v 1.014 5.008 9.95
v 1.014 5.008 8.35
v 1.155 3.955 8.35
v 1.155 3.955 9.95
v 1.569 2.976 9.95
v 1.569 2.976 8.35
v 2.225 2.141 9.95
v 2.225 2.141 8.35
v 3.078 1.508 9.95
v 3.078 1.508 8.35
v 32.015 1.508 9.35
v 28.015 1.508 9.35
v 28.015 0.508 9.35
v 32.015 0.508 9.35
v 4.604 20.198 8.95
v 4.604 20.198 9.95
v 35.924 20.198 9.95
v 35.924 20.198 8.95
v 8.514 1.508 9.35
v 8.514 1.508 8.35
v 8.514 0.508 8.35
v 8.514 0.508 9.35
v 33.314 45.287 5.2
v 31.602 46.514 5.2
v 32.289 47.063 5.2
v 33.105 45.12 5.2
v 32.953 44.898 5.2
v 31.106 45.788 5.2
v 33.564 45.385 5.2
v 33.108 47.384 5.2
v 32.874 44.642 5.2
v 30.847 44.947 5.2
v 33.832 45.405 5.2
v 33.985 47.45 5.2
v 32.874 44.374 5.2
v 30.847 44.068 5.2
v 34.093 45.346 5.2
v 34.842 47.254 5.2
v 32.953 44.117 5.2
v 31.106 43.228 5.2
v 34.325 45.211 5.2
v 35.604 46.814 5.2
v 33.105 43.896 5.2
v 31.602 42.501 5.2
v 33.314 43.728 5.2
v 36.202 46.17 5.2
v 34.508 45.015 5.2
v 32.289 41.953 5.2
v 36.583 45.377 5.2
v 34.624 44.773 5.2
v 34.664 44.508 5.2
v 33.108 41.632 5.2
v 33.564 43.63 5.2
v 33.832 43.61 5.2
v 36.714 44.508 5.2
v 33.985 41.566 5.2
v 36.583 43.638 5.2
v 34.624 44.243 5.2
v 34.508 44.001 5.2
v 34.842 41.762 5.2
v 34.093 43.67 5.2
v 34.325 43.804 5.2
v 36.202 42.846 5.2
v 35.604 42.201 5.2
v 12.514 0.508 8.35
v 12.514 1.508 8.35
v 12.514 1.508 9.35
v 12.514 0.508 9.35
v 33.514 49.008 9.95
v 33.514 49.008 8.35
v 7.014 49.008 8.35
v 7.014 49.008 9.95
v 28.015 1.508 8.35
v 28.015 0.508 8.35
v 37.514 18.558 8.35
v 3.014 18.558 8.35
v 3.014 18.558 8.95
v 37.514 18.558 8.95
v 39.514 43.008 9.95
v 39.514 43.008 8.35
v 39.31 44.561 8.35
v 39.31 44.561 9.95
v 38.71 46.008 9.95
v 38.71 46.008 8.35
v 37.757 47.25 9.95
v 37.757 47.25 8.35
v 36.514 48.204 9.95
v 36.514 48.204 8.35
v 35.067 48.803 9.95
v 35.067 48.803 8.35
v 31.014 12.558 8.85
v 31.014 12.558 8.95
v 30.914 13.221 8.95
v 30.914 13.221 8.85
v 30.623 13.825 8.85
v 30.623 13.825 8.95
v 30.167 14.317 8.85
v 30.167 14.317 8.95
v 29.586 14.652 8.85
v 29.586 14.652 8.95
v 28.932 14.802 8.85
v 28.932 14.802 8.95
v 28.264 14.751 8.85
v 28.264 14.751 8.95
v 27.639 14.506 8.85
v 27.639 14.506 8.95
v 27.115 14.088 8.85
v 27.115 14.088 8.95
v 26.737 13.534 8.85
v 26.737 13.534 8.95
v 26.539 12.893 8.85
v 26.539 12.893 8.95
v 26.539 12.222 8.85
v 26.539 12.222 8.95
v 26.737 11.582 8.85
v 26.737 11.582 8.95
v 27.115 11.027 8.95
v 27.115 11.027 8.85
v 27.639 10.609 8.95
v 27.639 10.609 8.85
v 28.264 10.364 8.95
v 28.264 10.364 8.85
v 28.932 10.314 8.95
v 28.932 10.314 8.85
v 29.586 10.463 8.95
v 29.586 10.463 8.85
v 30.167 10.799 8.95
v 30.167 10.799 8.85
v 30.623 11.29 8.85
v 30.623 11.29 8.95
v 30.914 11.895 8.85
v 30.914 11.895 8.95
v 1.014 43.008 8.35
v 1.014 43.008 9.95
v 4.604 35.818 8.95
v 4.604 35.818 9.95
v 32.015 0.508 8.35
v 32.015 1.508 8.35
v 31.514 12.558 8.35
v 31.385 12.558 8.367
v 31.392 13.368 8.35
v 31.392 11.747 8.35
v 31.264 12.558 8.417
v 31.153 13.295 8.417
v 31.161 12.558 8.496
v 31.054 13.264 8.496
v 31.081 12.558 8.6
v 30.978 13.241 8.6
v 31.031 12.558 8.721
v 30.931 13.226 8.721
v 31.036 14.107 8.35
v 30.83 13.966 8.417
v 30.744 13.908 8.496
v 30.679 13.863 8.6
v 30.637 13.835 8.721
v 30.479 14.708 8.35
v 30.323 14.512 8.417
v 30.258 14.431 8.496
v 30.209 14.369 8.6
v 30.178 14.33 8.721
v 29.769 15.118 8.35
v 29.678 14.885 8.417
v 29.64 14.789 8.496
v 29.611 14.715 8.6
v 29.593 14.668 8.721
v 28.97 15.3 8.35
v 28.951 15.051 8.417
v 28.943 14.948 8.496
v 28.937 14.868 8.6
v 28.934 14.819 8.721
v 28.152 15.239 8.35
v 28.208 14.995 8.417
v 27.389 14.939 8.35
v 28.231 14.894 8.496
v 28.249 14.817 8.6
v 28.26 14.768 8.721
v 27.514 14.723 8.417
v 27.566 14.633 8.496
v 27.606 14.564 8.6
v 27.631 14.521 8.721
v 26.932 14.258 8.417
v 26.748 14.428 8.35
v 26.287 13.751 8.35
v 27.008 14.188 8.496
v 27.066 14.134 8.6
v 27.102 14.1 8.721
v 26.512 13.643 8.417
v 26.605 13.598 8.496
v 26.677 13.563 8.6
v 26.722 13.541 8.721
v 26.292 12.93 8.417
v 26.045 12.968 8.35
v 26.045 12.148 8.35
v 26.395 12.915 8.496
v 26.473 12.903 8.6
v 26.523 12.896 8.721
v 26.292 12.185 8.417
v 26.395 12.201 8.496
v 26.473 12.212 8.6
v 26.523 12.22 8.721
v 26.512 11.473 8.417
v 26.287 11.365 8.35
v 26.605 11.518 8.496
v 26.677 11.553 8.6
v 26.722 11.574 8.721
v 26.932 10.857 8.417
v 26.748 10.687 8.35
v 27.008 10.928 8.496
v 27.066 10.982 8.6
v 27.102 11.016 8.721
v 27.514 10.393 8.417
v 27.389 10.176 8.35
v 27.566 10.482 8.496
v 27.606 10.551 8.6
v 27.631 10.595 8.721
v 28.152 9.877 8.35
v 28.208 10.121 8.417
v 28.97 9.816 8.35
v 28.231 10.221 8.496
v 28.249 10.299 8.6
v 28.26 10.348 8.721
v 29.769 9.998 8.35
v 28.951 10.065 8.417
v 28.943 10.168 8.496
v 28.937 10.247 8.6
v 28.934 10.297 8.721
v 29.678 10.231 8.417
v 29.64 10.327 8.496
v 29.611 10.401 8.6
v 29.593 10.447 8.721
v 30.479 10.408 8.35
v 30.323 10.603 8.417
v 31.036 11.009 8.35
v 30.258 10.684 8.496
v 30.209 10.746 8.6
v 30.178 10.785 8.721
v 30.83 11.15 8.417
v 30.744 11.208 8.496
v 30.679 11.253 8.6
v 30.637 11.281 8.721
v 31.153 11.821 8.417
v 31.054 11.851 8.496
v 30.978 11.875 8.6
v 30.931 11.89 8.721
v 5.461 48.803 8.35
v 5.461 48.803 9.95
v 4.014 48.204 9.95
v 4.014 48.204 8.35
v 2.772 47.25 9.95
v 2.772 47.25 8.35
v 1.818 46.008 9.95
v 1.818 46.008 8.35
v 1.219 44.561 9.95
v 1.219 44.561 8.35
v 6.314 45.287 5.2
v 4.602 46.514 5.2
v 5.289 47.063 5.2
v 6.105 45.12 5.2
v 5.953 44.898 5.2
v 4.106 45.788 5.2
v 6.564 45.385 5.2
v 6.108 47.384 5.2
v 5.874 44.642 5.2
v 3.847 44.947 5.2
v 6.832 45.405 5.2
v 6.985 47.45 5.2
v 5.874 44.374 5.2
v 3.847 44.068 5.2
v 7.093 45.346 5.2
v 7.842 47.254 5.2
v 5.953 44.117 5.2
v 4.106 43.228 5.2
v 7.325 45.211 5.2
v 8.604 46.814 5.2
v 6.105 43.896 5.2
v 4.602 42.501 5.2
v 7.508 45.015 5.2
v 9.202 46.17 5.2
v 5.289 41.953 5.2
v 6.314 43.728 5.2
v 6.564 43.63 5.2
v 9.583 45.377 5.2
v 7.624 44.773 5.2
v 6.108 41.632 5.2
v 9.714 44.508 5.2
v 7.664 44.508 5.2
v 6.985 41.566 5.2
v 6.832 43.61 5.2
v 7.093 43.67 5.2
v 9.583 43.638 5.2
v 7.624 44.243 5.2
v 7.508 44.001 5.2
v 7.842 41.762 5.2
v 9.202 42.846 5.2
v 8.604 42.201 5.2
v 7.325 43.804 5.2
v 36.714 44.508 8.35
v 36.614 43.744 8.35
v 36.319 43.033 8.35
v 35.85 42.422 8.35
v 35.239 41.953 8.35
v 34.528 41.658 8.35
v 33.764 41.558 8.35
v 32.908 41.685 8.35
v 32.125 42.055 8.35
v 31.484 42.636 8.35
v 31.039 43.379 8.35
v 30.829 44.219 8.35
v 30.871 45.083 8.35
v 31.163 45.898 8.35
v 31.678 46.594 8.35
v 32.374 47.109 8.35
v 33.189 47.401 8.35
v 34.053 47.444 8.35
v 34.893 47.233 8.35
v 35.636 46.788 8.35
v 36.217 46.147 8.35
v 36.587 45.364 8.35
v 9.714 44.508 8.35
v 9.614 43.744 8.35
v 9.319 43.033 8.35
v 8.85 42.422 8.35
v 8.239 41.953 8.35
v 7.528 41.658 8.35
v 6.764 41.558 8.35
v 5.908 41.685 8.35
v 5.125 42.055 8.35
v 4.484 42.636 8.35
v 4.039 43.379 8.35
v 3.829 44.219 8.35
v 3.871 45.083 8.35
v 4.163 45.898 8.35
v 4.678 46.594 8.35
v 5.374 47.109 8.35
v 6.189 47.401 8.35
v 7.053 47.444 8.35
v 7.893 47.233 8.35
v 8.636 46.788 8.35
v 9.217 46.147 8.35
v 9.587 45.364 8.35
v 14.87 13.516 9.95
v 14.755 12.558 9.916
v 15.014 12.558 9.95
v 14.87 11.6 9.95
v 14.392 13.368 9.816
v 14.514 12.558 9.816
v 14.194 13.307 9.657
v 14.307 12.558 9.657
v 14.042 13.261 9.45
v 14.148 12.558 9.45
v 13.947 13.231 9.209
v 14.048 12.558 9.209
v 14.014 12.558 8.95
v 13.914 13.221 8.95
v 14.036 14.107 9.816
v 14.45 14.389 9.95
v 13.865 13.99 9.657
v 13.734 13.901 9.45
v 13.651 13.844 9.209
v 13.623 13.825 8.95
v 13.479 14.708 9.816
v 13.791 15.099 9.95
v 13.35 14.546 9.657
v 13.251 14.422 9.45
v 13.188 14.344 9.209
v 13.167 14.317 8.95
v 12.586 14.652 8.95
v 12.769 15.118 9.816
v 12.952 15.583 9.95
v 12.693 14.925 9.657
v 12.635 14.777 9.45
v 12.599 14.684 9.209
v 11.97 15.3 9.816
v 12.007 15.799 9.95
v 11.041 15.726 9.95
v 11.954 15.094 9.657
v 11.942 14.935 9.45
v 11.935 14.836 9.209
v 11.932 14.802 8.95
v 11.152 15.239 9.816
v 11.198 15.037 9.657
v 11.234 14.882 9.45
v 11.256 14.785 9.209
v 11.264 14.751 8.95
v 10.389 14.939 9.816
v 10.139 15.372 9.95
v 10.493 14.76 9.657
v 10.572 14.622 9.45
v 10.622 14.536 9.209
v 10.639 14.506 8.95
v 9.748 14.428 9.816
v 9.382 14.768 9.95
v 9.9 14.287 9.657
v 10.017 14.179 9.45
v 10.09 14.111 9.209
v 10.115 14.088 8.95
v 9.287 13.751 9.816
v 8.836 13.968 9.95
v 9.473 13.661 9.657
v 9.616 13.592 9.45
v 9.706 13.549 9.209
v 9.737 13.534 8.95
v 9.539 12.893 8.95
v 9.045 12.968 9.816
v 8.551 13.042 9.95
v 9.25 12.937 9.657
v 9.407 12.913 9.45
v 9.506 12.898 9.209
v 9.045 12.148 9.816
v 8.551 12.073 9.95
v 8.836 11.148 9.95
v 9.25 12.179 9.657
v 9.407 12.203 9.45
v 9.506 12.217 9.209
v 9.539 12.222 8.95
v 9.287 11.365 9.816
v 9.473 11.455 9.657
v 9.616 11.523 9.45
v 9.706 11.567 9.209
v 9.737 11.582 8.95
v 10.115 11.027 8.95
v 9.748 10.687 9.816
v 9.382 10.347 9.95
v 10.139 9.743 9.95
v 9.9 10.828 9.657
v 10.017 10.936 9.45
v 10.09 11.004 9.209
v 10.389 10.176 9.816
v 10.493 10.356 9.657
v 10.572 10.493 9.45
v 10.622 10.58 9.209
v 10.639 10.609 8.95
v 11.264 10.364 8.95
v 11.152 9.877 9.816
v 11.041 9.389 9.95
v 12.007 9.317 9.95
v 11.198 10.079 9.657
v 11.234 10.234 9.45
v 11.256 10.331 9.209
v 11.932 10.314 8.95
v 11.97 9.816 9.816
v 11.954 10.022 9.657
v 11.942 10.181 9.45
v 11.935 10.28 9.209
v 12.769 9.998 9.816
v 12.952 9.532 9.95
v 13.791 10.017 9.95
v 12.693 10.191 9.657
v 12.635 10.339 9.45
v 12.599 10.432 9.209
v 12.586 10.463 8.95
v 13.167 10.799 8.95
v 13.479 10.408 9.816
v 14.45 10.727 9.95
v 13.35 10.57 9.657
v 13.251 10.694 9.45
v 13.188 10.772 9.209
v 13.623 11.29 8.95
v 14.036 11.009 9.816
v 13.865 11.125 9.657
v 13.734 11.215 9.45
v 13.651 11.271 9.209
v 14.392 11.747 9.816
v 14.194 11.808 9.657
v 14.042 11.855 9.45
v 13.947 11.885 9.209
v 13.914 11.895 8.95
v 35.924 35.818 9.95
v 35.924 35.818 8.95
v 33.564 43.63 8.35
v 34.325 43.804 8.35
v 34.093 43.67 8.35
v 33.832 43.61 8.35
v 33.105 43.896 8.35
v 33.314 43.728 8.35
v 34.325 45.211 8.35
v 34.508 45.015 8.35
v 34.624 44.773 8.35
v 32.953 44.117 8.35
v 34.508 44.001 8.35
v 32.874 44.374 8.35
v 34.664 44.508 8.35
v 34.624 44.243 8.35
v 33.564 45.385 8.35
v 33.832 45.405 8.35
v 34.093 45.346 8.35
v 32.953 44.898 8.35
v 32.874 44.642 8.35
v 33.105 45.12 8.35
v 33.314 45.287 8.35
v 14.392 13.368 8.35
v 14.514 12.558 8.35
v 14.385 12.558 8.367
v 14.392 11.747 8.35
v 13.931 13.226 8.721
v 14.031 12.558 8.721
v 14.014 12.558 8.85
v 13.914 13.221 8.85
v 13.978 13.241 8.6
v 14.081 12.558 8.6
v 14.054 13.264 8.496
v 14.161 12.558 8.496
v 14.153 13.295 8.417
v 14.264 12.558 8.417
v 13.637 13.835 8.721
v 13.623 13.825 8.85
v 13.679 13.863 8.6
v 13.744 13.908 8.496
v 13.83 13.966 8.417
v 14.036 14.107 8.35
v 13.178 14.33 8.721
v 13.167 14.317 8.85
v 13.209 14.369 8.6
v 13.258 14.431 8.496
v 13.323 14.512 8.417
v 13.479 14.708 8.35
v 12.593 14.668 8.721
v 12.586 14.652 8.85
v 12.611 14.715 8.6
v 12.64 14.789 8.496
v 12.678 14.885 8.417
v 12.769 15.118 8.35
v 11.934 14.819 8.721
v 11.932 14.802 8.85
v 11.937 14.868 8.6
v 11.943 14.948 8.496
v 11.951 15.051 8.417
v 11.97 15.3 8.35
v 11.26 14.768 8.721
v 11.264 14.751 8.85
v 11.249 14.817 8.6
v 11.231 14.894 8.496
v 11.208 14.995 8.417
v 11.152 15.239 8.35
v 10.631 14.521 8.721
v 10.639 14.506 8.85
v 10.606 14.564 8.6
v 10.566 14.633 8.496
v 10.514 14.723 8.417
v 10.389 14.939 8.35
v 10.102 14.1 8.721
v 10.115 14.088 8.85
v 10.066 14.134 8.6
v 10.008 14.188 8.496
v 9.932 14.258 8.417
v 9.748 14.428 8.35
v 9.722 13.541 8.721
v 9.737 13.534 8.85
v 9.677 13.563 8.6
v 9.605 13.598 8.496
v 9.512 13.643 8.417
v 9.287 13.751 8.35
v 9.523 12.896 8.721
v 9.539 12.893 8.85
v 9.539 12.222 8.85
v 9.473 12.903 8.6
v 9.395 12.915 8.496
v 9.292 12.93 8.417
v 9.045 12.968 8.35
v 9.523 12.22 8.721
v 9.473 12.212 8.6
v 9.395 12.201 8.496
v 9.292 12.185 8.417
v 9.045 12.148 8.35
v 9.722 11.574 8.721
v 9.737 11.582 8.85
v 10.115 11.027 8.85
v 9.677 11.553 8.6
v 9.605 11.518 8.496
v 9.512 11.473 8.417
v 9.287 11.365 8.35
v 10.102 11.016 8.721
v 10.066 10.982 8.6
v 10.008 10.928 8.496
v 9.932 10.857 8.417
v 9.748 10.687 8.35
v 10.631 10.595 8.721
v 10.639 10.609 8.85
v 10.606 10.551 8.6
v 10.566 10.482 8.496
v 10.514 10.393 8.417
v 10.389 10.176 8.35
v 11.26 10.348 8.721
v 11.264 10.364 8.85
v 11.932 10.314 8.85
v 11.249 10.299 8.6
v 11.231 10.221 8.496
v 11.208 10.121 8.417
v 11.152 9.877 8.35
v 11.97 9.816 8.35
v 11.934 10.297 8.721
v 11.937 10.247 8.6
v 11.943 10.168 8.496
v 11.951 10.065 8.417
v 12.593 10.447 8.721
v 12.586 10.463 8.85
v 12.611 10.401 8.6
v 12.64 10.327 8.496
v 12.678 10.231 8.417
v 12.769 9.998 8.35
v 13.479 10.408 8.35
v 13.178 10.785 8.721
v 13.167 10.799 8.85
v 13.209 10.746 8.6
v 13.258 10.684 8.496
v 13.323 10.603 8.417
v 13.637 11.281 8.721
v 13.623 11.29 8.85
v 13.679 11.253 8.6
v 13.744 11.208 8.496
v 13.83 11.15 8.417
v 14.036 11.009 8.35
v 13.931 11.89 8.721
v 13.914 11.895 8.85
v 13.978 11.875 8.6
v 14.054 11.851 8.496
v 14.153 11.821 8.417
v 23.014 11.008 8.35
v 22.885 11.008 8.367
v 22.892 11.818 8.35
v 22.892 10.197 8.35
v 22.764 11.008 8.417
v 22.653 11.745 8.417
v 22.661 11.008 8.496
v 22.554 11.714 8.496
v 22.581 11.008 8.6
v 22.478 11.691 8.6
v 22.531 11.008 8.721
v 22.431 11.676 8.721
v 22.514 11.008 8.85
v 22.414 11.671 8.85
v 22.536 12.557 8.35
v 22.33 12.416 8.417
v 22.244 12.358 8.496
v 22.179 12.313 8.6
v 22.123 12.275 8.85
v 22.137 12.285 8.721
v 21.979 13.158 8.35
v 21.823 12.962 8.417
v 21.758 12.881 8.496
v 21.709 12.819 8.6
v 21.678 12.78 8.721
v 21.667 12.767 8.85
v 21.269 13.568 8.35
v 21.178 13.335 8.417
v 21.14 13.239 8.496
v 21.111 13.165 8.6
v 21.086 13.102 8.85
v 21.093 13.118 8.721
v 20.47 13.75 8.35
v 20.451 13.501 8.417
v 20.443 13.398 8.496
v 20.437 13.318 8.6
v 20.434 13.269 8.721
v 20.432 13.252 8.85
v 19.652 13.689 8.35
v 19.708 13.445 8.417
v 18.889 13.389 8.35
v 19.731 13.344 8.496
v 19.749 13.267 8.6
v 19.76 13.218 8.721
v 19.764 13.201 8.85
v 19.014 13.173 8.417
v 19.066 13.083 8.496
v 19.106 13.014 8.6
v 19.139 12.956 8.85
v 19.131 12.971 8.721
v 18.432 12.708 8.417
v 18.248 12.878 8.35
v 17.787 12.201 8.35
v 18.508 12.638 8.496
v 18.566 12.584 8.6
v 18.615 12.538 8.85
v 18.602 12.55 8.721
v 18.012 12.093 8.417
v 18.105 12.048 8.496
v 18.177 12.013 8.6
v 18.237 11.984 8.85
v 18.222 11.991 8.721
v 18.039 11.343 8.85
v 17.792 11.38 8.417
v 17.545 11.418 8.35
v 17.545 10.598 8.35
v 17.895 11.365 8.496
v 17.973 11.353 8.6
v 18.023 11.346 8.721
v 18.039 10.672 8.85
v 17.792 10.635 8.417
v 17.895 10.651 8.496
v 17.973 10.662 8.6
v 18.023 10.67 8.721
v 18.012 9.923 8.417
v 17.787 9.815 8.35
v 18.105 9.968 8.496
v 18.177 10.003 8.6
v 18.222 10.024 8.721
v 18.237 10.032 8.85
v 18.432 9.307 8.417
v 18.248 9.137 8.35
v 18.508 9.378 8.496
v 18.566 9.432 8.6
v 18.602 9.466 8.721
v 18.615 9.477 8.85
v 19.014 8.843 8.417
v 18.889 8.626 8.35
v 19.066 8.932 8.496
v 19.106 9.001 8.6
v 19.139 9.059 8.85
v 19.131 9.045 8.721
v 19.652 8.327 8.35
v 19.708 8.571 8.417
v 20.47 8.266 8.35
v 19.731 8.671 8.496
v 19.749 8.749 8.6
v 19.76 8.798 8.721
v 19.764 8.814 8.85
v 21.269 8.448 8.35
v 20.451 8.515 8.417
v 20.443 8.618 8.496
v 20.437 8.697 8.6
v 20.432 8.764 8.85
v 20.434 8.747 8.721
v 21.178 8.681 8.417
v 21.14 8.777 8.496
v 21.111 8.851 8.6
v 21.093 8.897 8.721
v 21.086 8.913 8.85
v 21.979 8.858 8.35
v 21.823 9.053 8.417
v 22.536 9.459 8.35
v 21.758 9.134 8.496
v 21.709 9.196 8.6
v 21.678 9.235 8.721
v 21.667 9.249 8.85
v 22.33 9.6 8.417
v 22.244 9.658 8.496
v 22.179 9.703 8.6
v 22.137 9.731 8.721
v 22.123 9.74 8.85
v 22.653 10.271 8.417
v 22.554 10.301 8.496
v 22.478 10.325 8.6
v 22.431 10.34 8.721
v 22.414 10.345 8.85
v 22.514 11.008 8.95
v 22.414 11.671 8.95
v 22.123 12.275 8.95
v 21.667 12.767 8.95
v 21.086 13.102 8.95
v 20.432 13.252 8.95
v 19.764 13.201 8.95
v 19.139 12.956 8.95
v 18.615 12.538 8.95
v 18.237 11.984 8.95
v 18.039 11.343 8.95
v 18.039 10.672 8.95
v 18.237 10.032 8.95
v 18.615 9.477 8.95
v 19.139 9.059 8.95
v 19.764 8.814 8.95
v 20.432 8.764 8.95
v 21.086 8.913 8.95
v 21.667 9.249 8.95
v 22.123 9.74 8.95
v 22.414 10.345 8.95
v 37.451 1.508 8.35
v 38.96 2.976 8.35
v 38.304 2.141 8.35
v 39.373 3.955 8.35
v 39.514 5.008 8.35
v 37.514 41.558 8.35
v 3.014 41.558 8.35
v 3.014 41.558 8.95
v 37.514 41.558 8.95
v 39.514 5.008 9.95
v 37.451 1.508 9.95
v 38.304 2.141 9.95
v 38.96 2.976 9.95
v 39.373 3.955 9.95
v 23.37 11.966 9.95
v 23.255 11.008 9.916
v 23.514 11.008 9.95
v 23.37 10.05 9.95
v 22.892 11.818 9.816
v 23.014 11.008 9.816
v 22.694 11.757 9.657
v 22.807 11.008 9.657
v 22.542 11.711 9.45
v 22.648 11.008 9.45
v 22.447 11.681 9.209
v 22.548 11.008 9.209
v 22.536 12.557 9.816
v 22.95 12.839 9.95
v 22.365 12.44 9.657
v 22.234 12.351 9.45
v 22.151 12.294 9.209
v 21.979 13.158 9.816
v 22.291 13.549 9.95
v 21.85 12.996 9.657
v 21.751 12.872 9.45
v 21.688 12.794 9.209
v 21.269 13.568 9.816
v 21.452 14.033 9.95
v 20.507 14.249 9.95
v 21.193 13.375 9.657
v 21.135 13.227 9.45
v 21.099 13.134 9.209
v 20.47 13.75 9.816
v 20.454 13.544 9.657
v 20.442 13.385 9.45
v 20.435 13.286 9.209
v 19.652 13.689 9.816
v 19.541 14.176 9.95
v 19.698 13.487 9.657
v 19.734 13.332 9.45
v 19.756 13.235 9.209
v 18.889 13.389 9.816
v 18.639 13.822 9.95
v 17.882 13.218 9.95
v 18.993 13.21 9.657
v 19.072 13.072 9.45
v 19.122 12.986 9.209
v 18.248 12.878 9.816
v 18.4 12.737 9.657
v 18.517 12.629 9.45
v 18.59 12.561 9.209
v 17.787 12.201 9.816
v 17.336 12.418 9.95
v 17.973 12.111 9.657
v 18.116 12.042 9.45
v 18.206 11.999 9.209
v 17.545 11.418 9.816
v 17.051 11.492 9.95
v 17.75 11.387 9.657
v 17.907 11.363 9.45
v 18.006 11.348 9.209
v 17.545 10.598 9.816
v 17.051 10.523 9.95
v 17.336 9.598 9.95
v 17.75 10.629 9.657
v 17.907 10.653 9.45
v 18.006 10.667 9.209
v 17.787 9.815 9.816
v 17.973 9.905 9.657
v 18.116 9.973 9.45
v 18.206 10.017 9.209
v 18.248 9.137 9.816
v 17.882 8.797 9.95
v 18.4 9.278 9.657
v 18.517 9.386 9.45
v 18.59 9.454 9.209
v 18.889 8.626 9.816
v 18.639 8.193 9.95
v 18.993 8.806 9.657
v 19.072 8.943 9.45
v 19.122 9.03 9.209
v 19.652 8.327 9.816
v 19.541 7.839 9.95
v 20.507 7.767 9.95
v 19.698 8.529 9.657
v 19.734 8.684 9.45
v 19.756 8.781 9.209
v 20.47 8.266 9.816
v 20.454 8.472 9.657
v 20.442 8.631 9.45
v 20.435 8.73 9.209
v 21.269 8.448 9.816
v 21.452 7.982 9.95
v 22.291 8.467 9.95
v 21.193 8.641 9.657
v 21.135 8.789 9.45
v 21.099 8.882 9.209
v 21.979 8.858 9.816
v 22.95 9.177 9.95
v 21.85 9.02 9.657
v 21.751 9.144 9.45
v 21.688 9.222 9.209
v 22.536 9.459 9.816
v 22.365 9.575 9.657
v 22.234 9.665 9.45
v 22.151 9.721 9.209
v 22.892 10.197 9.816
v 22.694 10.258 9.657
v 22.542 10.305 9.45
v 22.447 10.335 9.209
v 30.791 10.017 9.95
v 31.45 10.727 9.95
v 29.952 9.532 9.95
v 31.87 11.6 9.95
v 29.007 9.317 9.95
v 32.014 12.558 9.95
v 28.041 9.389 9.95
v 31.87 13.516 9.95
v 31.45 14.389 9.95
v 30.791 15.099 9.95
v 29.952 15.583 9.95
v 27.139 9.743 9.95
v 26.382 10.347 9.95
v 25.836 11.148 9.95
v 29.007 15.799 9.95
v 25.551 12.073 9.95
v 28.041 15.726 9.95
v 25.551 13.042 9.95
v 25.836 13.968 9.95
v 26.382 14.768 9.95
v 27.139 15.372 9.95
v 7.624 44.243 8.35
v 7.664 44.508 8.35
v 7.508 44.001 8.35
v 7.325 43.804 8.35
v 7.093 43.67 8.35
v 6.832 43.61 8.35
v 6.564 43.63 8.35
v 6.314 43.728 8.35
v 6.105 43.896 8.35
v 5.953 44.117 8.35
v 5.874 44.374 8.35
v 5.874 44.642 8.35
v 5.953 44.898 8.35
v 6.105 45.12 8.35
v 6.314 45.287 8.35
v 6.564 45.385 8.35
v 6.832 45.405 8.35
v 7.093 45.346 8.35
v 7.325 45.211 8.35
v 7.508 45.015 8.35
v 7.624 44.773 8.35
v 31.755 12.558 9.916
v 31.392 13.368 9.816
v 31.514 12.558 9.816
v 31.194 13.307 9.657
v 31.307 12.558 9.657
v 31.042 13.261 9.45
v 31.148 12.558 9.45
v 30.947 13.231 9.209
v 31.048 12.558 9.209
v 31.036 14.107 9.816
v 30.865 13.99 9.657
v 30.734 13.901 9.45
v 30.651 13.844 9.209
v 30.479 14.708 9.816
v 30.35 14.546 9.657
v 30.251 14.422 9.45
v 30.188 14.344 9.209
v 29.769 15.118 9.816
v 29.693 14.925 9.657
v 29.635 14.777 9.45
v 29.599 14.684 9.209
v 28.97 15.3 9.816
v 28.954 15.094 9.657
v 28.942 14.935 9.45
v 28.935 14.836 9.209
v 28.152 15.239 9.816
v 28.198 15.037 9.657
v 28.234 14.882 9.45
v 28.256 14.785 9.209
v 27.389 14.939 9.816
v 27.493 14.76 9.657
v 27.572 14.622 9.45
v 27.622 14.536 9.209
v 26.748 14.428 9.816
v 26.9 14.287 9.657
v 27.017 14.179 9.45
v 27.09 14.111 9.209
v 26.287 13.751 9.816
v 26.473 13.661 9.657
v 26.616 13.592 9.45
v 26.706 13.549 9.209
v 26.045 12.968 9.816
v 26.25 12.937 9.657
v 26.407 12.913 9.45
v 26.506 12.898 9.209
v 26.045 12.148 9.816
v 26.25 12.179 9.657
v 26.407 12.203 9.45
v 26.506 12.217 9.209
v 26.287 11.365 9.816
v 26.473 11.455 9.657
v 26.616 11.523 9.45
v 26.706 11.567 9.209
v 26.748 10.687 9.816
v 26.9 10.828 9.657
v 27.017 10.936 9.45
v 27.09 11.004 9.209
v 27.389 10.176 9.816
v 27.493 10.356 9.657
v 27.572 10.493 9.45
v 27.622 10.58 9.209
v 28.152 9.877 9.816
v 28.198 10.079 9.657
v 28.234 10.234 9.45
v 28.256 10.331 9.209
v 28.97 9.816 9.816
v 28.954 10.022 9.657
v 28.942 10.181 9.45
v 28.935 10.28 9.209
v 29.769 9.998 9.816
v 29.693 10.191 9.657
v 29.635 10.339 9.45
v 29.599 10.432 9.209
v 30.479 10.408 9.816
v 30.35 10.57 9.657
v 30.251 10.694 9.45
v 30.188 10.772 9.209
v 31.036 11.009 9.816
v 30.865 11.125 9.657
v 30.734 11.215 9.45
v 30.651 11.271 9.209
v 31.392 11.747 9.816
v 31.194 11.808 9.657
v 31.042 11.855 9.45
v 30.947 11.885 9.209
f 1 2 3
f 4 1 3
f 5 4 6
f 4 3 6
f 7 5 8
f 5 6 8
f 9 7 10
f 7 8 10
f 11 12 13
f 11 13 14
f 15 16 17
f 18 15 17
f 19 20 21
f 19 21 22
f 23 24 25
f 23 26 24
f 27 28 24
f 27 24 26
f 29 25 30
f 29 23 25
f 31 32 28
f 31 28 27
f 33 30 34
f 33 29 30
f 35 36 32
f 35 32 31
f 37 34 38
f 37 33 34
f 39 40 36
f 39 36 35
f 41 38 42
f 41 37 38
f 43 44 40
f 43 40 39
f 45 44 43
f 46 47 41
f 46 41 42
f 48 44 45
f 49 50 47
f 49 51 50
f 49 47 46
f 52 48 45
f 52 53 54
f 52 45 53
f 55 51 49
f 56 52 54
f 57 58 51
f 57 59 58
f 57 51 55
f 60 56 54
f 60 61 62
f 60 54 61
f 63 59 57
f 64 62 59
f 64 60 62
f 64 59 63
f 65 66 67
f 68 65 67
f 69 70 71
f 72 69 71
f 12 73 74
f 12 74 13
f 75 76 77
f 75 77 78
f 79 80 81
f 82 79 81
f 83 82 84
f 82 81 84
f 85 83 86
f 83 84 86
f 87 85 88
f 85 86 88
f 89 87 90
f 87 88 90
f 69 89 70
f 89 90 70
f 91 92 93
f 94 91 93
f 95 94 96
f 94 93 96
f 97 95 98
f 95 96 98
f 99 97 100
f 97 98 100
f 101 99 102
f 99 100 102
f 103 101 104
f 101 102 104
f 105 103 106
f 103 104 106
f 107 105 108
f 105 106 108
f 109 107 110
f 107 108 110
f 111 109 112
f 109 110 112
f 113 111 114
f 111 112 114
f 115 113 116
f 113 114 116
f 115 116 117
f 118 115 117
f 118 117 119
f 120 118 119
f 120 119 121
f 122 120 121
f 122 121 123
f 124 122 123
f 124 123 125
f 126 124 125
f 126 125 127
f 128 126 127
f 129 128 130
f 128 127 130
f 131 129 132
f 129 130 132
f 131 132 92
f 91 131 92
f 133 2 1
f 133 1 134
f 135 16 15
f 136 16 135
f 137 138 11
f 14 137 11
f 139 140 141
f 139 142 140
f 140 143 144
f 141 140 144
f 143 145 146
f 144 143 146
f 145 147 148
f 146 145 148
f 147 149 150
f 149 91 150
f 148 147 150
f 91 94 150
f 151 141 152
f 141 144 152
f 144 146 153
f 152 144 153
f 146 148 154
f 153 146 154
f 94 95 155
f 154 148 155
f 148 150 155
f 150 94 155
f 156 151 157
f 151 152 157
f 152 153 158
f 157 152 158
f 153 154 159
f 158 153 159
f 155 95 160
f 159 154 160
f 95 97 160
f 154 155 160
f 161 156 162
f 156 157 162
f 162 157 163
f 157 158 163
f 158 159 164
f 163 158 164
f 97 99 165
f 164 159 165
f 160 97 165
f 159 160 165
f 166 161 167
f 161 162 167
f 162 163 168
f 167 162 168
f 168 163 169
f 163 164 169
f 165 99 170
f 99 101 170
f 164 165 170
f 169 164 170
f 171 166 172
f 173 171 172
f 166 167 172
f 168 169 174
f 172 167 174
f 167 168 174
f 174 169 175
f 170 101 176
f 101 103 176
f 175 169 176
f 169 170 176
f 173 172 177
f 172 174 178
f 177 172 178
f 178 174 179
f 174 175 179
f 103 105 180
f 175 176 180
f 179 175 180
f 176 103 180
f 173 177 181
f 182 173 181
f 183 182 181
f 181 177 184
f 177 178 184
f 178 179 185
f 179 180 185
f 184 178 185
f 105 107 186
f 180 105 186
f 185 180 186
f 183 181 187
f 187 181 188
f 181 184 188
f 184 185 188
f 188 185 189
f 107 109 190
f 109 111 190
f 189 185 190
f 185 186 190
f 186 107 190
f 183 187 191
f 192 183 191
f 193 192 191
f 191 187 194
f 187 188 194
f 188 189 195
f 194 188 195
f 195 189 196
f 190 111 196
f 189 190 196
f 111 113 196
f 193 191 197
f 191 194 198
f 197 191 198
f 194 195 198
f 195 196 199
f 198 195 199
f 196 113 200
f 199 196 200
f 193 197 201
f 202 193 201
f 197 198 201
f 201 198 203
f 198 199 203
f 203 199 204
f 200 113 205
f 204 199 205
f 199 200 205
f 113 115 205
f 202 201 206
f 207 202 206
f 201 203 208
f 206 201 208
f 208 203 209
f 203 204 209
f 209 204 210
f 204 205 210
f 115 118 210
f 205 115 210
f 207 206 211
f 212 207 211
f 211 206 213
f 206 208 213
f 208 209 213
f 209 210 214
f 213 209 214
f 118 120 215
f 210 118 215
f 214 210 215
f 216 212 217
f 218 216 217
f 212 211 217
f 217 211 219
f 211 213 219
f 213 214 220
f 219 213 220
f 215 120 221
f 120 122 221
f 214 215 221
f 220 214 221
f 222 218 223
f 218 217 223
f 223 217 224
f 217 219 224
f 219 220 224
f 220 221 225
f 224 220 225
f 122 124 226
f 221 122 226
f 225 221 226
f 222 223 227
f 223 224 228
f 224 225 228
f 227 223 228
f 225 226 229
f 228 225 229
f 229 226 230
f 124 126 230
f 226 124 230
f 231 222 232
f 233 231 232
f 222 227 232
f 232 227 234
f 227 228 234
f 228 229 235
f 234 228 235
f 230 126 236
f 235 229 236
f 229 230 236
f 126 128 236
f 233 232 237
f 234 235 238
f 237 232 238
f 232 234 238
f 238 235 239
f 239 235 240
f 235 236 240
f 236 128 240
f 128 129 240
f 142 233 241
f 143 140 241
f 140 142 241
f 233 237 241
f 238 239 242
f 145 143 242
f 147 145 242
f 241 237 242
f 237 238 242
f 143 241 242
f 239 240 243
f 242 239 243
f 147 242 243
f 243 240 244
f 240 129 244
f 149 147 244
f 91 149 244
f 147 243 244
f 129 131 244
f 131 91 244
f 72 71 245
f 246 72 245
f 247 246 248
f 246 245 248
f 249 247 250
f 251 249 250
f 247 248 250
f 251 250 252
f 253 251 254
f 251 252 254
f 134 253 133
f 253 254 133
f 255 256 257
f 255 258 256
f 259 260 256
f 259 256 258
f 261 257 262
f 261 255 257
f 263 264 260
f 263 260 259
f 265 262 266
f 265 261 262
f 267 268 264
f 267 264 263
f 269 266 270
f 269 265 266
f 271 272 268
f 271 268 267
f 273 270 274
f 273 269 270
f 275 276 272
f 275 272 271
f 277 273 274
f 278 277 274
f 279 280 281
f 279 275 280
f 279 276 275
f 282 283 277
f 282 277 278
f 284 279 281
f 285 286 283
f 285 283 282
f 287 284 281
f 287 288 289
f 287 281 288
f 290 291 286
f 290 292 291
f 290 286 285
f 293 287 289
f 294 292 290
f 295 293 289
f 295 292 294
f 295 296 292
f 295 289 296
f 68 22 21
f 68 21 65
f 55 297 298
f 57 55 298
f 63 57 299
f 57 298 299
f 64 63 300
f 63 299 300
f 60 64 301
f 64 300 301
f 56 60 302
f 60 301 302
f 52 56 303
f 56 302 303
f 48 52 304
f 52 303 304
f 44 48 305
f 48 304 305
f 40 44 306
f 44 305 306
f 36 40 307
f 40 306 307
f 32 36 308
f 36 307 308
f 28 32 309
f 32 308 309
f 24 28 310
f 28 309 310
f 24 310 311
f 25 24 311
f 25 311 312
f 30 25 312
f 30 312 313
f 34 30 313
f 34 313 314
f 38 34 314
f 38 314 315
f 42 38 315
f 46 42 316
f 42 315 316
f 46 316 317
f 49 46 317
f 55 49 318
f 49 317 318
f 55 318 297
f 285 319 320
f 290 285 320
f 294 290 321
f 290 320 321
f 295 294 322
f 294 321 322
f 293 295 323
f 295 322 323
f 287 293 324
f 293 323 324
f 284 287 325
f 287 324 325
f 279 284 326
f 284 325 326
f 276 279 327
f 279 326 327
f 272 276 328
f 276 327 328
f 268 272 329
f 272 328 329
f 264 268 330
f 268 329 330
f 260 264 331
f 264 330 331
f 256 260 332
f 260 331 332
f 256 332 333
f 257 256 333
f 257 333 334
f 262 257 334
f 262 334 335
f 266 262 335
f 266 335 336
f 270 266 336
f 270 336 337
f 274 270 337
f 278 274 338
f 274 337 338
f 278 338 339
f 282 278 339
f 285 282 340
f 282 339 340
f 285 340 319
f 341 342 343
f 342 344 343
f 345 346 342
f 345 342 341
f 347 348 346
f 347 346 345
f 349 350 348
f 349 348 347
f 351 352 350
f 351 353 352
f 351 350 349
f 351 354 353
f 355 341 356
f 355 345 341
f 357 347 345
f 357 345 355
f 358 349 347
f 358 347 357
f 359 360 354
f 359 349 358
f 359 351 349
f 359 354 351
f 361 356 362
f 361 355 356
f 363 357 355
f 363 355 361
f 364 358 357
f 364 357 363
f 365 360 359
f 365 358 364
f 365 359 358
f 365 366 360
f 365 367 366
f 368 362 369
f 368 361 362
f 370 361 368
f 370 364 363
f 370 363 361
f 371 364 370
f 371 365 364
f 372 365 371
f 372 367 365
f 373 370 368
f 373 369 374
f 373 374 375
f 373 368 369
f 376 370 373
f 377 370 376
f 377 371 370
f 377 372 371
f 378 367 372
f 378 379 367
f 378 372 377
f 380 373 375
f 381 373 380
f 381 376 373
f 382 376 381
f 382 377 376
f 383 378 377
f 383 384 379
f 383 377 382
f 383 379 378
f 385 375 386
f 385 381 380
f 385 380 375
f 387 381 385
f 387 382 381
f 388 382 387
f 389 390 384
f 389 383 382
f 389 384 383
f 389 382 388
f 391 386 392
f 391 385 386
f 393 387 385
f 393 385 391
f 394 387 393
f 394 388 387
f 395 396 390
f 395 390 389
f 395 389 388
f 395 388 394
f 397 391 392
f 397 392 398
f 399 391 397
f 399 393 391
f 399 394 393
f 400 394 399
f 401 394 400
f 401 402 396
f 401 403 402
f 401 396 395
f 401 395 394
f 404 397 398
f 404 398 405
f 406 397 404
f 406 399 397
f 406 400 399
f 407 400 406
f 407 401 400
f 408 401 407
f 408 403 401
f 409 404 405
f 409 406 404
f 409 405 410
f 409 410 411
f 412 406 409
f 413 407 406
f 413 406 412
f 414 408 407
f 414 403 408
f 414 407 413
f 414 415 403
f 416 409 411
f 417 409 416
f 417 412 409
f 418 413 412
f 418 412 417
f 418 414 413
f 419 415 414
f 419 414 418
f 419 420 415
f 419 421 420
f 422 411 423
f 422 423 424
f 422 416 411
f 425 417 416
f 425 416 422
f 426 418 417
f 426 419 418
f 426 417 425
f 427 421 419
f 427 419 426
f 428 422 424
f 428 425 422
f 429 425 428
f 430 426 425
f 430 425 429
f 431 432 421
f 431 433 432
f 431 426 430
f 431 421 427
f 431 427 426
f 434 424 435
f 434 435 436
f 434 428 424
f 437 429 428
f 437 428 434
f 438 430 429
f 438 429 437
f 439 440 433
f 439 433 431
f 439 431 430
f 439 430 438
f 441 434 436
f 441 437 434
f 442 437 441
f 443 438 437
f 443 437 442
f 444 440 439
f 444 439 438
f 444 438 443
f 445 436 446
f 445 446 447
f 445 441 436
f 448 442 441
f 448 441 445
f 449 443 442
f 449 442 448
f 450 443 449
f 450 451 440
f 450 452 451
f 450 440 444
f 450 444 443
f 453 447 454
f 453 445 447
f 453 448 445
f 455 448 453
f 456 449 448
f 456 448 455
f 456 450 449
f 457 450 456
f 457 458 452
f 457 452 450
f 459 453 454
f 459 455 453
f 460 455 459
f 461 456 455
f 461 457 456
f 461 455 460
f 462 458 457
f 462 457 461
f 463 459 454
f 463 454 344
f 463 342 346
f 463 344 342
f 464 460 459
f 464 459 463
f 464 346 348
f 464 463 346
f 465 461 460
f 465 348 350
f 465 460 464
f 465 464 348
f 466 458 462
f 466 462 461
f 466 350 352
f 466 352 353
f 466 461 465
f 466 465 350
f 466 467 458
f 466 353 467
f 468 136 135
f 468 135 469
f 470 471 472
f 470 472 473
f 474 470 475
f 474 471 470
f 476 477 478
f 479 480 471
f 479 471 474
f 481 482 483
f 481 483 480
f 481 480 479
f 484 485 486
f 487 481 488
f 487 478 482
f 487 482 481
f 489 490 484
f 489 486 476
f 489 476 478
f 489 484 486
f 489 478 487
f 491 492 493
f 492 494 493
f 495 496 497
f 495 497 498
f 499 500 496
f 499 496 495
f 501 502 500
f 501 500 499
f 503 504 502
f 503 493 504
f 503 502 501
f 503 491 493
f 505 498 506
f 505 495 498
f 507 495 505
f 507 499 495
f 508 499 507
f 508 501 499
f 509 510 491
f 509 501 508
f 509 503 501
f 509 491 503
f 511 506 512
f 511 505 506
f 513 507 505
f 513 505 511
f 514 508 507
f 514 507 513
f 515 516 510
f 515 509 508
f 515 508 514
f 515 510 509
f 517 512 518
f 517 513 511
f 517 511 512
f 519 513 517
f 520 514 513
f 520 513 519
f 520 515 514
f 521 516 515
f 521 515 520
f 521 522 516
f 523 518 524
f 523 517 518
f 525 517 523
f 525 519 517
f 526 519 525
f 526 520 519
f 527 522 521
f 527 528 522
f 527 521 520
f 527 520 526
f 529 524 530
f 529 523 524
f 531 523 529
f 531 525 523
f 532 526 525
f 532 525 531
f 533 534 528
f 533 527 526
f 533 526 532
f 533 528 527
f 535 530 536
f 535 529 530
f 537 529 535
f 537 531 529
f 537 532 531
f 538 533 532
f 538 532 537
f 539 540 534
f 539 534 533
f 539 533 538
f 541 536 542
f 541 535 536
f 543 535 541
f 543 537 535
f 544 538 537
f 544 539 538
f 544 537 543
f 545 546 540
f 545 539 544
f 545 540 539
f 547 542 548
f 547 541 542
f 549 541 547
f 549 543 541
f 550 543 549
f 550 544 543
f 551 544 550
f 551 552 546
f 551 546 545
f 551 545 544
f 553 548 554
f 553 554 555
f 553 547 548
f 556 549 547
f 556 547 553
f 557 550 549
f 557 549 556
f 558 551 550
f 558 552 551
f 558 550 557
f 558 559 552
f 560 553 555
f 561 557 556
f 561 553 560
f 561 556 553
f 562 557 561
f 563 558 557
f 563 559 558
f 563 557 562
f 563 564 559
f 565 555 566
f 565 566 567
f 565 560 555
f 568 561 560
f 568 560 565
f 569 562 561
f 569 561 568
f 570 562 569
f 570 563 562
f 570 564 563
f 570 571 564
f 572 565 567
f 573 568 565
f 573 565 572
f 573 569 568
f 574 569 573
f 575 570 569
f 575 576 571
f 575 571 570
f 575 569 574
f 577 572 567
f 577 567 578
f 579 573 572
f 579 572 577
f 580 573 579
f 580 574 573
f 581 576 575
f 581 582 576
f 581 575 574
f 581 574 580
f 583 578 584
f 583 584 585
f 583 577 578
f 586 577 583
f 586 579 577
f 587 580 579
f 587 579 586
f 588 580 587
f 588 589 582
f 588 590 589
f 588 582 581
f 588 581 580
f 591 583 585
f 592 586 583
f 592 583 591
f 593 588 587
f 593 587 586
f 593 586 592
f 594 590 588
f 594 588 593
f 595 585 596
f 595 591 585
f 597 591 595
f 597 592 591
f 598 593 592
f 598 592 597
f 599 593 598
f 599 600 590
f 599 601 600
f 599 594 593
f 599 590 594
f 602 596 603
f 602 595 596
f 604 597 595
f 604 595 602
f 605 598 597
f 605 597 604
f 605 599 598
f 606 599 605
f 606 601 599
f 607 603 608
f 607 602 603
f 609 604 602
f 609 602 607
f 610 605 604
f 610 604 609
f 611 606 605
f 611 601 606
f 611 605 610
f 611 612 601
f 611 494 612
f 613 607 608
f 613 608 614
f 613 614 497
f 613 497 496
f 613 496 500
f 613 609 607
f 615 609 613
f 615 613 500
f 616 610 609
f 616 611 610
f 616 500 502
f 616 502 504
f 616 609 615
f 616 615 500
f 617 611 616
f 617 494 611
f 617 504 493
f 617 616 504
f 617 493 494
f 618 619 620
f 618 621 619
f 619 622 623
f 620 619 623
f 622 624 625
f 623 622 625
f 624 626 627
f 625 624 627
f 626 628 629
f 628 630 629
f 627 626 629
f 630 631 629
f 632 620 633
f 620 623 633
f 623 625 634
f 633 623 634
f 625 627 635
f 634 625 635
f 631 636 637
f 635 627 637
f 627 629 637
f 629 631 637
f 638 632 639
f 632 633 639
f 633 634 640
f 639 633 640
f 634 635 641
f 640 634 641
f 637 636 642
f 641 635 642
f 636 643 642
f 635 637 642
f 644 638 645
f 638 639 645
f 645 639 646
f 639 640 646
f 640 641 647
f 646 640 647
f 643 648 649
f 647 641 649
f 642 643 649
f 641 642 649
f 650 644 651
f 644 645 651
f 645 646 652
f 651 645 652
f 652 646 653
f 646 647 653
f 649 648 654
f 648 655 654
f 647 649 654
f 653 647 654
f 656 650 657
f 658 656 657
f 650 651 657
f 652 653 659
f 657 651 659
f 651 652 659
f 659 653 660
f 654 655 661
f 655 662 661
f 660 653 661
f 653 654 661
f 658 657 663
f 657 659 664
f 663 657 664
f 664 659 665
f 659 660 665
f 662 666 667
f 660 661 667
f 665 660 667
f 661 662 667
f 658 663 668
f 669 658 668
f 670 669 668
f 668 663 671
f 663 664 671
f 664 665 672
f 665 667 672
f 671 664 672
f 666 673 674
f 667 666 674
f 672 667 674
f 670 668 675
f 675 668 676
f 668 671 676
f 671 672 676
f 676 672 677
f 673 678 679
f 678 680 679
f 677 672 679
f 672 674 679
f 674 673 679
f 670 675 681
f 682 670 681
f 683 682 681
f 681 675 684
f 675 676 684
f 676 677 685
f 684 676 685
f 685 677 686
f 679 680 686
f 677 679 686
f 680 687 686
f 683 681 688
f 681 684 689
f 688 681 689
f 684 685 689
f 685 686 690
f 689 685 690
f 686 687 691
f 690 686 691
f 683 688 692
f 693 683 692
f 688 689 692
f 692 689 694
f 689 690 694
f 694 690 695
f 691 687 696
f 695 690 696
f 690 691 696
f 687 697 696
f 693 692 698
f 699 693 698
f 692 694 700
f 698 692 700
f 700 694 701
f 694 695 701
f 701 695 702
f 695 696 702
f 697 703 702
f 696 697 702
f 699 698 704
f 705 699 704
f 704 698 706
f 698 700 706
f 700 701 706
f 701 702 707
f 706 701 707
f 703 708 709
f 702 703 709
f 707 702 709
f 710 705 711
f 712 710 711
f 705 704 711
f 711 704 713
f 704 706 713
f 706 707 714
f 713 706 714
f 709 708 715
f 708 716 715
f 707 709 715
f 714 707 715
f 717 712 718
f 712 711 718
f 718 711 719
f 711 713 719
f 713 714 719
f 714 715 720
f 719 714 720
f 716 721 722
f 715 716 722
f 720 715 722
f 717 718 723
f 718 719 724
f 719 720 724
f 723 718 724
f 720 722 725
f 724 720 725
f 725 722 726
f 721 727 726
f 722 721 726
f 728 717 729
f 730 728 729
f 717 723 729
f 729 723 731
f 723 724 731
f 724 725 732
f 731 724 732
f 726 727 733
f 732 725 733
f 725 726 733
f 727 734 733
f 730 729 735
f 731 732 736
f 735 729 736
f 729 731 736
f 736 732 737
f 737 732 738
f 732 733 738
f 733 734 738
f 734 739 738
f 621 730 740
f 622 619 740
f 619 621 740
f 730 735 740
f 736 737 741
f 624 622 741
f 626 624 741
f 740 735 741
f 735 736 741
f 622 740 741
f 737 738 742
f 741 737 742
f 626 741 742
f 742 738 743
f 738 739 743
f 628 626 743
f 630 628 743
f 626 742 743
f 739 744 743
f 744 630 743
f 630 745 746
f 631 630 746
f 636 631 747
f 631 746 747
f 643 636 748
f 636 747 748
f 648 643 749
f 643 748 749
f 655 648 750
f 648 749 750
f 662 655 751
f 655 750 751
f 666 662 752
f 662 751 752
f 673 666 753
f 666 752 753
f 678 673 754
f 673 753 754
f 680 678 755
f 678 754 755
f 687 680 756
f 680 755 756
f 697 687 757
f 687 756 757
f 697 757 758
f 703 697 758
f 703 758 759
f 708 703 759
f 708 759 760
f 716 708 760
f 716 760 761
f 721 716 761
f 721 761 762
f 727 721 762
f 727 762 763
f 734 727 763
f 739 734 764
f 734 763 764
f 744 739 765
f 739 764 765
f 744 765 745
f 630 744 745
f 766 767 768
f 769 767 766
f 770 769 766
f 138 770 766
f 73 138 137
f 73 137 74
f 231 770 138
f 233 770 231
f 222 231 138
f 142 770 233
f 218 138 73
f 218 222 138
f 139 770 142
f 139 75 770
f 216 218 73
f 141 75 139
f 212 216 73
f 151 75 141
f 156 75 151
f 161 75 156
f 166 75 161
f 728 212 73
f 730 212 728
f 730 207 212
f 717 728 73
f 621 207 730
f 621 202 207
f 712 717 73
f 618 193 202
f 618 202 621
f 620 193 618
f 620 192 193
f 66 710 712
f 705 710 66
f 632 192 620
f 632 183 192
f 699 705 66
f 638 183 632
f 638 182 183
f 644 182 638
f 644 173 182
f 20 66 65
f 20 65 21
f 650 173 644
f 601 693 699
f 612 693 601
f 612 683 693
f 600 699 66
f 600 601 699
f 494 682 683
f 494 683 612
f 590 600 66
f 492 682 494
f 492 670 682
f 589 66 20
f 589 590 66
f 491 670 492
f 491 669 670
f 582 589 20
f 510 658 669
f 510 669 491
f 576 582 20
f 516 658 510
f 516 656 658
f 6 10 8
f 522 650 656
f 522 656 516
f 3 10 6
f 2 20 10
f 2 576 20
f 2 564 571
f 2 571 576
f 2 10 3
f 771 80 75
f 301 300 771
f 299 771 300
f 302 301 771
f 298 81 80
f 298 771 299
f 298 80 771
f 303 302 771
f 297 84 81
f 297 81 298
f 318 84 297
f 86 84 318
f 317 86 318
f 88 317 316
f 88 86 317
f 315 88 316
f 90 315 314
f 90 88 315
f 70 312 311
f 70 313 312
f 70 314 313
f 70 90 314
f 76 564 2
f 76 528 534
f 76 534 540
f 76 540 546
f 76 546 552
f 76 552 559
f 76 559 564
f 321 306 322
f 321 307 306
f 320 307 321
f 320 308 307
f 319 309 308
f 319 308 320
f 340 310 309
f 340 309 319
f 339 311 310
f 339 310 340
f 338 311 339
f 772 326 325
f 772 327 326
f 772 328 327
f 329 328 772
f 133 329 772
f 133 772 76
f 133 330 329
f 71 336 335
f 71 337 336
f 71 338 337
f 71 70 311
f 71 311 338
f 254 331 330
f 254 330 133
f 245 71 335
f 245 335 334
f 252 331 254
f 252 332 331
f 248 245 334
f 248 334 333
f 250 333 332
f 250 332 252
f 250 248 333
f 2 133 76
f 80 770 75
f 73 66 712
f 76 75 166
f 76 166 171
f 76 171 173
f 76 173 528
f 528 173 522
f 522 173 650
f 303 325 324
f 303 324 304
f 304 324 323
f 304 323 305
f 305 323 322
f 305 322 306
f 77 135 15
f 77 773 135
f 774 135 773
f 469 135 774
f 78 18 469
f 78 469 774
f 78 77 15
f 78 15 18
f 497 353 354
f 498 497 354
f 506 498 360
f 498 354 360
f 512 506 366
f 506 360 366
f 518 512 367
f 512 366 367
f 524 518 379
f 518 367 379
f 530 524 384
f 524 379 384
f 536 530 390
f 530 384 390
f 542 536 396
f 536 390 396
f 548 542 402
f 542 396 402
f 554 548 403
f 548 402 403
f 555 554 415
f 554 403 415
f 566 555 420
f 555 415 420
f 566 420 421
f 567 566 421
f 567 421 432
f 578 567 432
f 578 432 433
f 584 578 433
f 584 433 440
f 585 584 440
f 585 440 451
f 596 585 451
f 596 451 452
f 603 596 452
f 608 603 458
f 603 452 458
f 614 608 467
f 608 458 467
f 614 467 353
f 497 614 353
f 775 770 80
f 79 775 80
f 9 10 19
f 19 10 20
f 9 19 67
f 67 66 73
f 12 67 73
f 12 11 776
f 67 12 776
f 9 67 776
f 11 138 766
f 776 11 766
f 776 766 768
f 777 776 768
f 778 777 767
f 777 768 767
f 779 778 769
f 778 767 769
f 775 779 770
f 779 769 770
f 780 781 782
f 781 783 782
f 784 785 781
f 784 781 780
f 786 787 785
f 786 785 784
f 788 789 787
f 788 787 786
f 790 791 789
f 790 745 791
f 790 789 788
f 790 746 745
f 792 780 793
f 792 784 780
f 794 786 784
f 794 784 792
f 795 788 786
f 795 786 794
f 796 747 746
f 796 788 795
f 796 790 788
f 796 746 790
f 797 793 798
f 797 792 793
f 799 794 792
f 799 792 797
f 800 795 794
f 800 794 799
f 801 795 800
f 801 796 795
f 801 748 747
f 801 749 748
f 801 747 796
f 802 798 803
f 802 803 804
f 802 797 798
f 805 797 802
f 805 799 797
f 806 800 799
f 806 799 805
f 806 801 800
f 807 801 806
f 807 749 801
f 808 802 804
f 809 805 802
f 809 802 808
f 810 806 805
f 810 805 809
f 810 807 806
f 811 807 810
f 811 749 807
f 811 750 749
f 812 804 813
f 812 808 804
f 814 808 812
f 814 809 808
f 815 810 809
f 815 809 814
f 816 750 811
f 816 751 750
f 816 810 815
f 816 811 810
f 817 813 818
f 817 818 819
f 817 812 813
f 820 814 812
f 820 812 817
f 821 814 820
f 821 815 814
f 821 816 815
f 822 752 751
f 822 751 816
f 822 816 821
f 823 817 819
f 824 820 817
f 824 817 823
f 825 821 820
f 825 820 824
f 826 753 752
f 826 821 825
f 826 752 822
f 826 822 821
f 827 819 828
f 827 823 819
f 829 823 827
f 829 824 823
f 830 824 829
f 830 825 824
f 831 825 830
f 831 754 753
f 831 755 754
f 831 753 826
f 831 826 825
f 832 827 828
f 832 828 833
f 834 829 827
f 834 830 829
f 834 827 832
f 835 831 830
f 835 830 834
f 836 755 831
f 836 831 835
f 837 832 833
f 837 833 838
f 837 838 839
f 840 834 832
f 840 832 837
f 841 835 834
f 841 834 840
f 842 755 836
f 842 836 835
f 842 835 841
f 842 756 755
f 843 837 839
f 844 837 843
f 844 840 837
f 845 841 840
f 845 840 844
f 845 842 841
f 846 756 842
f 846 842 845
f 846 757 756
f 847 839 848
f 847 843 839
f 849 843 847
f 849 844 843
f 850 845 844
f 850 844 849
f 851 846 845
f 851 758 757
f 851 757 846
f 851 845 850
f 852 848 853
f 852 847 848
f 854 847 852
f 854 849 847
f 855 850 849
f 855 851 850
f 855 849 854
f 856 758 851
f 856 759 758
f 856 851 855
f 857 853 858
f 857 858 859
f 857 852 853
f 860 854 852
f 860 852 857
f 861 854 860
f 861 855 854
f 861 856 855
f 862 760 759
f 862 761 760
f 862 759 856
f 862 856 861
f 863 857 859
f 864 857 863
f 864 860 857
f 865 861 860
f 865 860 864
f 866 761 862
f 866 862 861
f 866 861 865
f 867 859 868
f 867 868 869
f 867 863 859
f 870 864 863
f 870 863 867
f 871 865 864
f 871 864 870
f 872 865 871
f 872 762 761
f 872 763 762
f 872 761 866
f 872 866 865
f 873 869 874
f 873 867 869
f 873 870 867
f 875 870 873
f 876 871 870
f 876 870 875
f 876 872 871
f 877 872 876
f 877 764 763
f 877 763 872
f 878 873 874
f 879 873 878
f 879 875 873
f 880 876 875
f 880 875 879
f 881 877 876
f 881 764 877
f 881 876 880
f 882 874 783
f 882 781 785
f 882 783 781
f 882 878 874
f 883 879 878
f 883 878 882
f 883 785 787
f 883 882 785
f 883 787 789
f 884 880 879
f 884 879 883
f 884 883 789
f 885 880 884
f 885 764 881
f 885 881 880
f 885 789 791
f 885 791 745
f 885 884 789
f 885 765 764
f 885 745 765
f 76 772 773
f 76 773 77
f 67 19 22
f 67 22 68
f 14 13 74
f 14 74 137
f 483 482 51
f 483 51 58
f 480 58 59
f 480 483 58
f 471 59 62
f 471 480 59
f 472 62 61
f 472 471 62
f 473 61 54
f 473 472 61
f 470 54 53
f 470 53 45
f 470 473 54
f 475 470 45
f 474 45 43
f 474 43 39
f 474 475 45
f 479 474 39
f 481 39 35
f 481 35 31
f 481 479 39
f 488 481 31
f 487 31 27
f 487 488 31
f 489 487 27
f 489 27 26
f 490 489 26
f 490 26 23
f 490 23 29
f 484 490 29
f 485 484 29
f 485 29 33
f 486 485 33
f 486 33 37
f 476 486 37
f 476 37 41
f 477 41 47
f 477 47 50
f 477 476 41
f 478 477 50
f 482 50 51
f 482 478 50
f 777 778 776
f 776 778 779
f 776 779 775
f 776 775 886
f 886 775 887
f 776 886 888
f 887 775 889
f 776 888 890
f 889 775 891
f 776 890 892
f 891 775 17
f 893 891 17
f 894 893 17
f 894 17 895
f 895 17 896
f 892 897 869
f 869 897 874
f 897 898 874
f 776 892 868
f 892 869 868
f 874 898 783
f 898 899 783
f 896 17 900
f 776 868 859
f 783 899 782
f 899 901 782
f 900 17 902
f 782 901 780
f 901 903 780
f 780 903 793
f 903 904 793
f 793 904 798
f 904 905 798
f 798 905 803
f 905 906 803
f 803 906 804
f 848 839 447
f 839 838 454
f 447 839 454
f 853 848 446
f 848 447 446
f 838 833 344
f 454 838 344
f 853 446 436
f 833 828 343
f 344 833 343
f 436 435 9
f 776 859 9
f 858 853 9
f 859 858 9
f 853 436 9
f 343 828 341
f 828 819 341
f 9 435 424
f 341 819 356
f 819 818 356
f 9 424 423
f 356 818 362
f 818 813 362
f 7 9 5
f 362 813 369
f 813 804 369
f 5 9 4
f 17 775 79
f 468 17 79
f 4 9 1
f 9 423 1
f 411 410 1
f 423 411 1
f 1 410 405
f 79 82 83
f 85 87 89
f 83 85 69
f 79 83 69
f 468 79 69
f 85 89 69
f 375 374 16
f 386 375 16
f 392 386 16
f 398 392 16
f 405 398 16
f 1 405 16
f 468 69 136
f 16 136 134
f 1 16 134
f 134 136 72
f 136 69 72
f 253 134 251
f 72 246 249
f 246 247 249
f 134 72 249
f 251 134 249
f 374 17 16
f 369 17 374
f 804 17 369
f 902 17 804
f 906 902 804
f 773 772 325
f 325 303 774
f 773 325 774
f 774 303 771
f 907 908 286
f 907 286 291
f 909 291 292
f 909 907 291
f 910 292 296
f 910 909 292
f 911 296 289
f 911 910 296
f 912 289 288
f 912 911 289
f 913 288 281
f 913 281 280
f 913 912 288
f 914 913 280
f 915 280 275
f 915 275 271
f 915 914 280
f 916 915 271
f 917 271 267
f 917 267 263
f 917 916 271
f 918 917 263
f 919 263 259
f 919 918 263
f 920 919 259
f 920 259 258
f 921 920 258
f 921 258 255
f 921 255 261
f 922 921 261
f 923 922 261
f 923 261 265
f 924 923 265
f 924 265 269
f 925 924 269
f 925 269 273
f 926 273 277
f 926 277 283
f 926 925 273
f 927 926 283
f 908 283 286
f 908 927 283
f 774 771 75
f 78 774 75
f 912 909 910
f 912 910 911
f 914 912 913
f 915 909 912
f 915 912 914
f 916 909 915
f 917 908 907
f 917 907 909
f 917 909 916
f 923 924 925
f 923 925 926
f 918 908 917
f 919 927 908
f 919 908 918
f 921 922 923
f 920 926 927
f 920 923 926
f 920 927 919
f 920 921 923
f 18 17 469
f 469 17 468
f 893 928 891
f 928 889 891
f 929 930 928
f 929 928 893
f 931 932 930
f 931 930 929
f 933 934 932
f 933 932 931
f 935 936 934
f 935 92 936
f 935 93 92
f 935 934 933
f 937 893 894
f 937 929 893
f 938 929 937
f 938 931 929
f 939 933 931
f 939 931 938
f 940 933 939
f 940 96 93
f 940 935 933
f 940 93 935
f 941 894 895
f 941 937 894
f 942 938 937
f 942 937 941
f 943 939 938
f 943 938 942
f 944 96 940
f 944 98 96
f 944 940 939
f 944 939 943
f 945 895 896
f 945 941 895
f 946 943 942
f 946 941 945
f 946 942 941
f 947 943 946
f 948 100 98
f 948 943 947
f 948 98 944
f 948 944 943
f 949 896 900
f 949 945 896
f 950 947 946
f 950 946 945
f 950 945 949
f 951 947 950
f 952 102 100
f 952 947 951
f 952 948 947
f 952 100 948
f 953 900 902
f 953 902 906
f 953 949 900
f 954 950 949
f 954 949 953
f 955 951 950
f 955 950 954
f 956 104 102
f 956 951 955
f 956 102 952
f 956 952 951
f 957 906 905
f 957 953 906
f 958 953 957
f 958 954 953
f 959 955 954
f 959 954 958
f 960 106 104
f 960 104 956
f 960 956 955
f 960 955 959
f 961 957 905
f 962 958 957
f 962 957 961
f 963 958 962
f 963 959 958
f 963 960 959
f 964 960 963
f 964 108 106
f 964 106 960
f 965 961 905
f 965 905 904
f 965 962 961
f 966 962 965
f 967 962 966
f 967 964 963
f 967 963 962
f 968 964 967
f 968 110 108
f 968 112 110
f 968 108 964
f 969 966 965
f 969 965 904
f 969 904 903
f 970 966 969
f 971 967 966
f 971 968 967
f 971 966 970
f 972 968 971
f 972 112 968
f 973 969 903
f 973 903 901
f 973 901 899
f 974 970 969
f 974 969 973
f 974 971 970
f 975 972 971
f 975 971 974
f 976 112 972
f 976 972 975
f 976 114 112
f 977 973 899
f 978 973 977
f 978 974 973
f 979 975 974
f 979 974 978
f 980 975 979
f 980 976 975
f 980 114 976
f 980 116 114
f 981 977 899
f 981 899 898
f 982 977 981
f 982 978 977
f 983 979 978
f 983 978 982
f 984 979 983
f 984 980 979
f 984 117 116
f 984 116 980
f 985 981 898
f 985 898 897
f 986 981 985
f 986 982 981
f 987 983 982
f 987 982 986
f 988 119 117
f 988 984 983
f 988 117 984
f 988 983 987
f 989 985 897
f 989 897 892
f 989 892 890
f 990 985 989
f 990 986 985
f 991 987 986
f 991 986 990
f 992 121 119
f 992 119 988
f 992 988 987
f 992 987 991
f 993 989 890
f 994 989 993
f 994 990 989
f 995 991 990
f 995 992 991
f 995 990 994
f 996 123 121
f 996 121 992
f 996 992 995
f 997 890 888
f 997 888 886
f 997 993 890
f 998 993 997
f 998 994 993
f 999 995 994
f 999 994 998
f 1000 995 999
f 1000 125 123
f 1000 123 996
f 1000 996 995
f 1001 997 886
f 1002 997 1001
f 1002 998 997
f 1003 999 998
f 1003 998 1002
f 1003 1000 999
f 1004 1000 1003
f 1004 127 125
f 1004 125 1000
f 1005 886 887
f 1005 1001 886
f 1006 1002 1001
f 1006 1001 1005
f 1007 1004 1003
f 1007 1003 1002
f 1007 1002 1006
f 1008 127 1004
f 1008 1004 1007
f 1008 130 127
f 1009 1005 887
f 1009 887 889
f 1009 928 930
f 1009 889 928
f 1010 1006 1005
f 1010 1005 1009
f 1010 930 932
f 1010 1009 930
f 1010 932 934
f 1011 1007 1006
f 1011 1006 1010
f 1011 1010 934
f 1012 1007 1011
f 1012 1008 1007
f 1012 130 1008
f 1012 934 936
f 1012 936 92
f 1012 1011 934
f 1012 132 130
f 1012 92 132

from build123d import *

# Parameters (mm, degrees)
PAD015_DEPTH    = 1.6
SKETCH025_W     = 4
SKETCH025_H     = 1
PAD016_DEPTH    = 1
SKETCH026_W     = 31.32
SKETCH026_H     = 15.62
POCKET006_DEPTH = 1.6
SKETCH027_R     = 2.25
POCKET007_DEPTH = 1.6
FILLET002_R     = 1
FILLET003_R     = 0.5
SKETCH028_W     = 34.5
SKETCH028_H     = 23
POCKET008_DEPTH = 0.6
SKETCH029_R     = 2.95
SKETCH029_R_2   = 0.9
PAD017_DEPTH    = 3.15


with BuildPart() as part:
    # Sketch024 (on Face1 of CopyPad014) → Pad015 (new body)
    with BuildSketch(Plane.XY.offset(8.35)):
        with BuildLine():
            Line((1.014303, 5.007822), (1.014303, 43.007822))
            ThreePointArc((7.014272, 49.007822), (2.771651, 47.250452), (1.014303, 43.007822))
            Line((33.514272, 49.007822), (7.014272, 49.007822))
            ThreePointArc((39.514303, 43.007822), (37.756933, 47.250473), (33.514272, 49.007822))
            Line((39.514303, 5.007822), (39.514303, 43.007822))
            ThreePointArc((37.450803, 1.507822), (38.960026, 2.976317), (39.514303, 5.007822))
            Line((3.077803, 1.507822), (37.450803, 1.507822))
            ThreePointArc((1.014303, 5.007822), (1.56858, 2.976317), (3.077803, 1.507822))
        make_face()
    extrude(amount=PAD015_DEPTH)

    # Sketch025 (on Face7 of Pad015) → Pad016 (join)
    with BuildSketch(Plane.XZ.offset(-1.507822)):
        with Locations((10.513803, 8.85)):
            Rectangle(SKETCH025_W, SKETCH025_H)
        with Locations((30.014803, 8.85)):
            Rectangle(SKETCH025_W, SKETCH025_H)
    extrude(amount=PAD016_DEPTH)

    # Sketch026 (on Face5 of Pad016) → Pocket006 (cut)
    with BuildSketch(Plane.XY.offset(9.95)):
        with Locations((20.264303, 28.007822)):
            Rectangle(SKETCH026_W, SKETCH026_H)
    extrude(amount=-POCKET006_DEPTH, mode=Mode.SUBTRACT)

    # Sketch027 (on Face5 of Pocket006) → Pocket007 (cut)
    with BuildSketch(Plane.XY.offset(9.95)):
        with Locations((11.764303, 12.557822)):
            Circle(SKETCH027_R)
        with Locations((20.264303, 11.007822)):
            Circle(SKETCH027_R)
        with Locations((28.764303, 12.557822)):
            Circle(SKETCH027_R)
    extrude(amount=-POCKET007_DEPTH, mode=Mode.SUBTRACT)

    # Fillet002
    fillet002_edges = [part.edges().sort_by_distance(p)[0] for p in [
        (9.514303, 12.557822, 9.95),
        (18.014303, 11.007822, 9.95),
        (26.514303, 12.557822, 9.95),
    ]]
    fillet(fillet002_edges, radius=FILLET002_R)

    # Fillet003
    fillet003_edges = [part.edges().sort_by_distance(p)[0] for p in [
        (9.514303, 12.557822, 8.35),
        (18.014303, 11.007822, 8.35),
        (26.514303, 12.557822, 8.35),
    ]]
    fillet(fillet003_edges, radius=FILLET003_R)

    # Sketch028 (on Face4 of Fillet003) → Pocket008 (cut)
    with BuildSketch(Plane(origin=(0, 0, 8.35), x_dir=(1, 0, 0), z_dir=(0, 0, -1))):
        with Locations((20.264303, -30.057822)):
            Rectangle(SKETCH028_W, SKETCH028_H)
    extrude(amount=-POCKET008_DEPTH, mode=Mode.SUBTRACT)

    # Sketch029 (on Face4 of Pocket008) → Pad017 (join)
    with BuildSketch(Plane(origin=(0, 0, 8.35), x_dir=(1, 0, 0), z_dir=(0, 0, -1))):
        with Locations((6.764303, -44.507822)):
            Circle(SKETCH029_R)
        with Locations((6.764303, -44.507822)):
            Circle(SKETCH029_R_2, mode=Mode.SUBTRACT)
        with Locations((33.764303, -44.507822)):
            Circle(SKETCH029_R)
        with Locations((33.764303, -44.507822)):
            Circle(SKETCH029_R_2, mode=Mode.SUBTRACT)
    extrude(amount=PAD017_DEPTH)


solid = part.part
